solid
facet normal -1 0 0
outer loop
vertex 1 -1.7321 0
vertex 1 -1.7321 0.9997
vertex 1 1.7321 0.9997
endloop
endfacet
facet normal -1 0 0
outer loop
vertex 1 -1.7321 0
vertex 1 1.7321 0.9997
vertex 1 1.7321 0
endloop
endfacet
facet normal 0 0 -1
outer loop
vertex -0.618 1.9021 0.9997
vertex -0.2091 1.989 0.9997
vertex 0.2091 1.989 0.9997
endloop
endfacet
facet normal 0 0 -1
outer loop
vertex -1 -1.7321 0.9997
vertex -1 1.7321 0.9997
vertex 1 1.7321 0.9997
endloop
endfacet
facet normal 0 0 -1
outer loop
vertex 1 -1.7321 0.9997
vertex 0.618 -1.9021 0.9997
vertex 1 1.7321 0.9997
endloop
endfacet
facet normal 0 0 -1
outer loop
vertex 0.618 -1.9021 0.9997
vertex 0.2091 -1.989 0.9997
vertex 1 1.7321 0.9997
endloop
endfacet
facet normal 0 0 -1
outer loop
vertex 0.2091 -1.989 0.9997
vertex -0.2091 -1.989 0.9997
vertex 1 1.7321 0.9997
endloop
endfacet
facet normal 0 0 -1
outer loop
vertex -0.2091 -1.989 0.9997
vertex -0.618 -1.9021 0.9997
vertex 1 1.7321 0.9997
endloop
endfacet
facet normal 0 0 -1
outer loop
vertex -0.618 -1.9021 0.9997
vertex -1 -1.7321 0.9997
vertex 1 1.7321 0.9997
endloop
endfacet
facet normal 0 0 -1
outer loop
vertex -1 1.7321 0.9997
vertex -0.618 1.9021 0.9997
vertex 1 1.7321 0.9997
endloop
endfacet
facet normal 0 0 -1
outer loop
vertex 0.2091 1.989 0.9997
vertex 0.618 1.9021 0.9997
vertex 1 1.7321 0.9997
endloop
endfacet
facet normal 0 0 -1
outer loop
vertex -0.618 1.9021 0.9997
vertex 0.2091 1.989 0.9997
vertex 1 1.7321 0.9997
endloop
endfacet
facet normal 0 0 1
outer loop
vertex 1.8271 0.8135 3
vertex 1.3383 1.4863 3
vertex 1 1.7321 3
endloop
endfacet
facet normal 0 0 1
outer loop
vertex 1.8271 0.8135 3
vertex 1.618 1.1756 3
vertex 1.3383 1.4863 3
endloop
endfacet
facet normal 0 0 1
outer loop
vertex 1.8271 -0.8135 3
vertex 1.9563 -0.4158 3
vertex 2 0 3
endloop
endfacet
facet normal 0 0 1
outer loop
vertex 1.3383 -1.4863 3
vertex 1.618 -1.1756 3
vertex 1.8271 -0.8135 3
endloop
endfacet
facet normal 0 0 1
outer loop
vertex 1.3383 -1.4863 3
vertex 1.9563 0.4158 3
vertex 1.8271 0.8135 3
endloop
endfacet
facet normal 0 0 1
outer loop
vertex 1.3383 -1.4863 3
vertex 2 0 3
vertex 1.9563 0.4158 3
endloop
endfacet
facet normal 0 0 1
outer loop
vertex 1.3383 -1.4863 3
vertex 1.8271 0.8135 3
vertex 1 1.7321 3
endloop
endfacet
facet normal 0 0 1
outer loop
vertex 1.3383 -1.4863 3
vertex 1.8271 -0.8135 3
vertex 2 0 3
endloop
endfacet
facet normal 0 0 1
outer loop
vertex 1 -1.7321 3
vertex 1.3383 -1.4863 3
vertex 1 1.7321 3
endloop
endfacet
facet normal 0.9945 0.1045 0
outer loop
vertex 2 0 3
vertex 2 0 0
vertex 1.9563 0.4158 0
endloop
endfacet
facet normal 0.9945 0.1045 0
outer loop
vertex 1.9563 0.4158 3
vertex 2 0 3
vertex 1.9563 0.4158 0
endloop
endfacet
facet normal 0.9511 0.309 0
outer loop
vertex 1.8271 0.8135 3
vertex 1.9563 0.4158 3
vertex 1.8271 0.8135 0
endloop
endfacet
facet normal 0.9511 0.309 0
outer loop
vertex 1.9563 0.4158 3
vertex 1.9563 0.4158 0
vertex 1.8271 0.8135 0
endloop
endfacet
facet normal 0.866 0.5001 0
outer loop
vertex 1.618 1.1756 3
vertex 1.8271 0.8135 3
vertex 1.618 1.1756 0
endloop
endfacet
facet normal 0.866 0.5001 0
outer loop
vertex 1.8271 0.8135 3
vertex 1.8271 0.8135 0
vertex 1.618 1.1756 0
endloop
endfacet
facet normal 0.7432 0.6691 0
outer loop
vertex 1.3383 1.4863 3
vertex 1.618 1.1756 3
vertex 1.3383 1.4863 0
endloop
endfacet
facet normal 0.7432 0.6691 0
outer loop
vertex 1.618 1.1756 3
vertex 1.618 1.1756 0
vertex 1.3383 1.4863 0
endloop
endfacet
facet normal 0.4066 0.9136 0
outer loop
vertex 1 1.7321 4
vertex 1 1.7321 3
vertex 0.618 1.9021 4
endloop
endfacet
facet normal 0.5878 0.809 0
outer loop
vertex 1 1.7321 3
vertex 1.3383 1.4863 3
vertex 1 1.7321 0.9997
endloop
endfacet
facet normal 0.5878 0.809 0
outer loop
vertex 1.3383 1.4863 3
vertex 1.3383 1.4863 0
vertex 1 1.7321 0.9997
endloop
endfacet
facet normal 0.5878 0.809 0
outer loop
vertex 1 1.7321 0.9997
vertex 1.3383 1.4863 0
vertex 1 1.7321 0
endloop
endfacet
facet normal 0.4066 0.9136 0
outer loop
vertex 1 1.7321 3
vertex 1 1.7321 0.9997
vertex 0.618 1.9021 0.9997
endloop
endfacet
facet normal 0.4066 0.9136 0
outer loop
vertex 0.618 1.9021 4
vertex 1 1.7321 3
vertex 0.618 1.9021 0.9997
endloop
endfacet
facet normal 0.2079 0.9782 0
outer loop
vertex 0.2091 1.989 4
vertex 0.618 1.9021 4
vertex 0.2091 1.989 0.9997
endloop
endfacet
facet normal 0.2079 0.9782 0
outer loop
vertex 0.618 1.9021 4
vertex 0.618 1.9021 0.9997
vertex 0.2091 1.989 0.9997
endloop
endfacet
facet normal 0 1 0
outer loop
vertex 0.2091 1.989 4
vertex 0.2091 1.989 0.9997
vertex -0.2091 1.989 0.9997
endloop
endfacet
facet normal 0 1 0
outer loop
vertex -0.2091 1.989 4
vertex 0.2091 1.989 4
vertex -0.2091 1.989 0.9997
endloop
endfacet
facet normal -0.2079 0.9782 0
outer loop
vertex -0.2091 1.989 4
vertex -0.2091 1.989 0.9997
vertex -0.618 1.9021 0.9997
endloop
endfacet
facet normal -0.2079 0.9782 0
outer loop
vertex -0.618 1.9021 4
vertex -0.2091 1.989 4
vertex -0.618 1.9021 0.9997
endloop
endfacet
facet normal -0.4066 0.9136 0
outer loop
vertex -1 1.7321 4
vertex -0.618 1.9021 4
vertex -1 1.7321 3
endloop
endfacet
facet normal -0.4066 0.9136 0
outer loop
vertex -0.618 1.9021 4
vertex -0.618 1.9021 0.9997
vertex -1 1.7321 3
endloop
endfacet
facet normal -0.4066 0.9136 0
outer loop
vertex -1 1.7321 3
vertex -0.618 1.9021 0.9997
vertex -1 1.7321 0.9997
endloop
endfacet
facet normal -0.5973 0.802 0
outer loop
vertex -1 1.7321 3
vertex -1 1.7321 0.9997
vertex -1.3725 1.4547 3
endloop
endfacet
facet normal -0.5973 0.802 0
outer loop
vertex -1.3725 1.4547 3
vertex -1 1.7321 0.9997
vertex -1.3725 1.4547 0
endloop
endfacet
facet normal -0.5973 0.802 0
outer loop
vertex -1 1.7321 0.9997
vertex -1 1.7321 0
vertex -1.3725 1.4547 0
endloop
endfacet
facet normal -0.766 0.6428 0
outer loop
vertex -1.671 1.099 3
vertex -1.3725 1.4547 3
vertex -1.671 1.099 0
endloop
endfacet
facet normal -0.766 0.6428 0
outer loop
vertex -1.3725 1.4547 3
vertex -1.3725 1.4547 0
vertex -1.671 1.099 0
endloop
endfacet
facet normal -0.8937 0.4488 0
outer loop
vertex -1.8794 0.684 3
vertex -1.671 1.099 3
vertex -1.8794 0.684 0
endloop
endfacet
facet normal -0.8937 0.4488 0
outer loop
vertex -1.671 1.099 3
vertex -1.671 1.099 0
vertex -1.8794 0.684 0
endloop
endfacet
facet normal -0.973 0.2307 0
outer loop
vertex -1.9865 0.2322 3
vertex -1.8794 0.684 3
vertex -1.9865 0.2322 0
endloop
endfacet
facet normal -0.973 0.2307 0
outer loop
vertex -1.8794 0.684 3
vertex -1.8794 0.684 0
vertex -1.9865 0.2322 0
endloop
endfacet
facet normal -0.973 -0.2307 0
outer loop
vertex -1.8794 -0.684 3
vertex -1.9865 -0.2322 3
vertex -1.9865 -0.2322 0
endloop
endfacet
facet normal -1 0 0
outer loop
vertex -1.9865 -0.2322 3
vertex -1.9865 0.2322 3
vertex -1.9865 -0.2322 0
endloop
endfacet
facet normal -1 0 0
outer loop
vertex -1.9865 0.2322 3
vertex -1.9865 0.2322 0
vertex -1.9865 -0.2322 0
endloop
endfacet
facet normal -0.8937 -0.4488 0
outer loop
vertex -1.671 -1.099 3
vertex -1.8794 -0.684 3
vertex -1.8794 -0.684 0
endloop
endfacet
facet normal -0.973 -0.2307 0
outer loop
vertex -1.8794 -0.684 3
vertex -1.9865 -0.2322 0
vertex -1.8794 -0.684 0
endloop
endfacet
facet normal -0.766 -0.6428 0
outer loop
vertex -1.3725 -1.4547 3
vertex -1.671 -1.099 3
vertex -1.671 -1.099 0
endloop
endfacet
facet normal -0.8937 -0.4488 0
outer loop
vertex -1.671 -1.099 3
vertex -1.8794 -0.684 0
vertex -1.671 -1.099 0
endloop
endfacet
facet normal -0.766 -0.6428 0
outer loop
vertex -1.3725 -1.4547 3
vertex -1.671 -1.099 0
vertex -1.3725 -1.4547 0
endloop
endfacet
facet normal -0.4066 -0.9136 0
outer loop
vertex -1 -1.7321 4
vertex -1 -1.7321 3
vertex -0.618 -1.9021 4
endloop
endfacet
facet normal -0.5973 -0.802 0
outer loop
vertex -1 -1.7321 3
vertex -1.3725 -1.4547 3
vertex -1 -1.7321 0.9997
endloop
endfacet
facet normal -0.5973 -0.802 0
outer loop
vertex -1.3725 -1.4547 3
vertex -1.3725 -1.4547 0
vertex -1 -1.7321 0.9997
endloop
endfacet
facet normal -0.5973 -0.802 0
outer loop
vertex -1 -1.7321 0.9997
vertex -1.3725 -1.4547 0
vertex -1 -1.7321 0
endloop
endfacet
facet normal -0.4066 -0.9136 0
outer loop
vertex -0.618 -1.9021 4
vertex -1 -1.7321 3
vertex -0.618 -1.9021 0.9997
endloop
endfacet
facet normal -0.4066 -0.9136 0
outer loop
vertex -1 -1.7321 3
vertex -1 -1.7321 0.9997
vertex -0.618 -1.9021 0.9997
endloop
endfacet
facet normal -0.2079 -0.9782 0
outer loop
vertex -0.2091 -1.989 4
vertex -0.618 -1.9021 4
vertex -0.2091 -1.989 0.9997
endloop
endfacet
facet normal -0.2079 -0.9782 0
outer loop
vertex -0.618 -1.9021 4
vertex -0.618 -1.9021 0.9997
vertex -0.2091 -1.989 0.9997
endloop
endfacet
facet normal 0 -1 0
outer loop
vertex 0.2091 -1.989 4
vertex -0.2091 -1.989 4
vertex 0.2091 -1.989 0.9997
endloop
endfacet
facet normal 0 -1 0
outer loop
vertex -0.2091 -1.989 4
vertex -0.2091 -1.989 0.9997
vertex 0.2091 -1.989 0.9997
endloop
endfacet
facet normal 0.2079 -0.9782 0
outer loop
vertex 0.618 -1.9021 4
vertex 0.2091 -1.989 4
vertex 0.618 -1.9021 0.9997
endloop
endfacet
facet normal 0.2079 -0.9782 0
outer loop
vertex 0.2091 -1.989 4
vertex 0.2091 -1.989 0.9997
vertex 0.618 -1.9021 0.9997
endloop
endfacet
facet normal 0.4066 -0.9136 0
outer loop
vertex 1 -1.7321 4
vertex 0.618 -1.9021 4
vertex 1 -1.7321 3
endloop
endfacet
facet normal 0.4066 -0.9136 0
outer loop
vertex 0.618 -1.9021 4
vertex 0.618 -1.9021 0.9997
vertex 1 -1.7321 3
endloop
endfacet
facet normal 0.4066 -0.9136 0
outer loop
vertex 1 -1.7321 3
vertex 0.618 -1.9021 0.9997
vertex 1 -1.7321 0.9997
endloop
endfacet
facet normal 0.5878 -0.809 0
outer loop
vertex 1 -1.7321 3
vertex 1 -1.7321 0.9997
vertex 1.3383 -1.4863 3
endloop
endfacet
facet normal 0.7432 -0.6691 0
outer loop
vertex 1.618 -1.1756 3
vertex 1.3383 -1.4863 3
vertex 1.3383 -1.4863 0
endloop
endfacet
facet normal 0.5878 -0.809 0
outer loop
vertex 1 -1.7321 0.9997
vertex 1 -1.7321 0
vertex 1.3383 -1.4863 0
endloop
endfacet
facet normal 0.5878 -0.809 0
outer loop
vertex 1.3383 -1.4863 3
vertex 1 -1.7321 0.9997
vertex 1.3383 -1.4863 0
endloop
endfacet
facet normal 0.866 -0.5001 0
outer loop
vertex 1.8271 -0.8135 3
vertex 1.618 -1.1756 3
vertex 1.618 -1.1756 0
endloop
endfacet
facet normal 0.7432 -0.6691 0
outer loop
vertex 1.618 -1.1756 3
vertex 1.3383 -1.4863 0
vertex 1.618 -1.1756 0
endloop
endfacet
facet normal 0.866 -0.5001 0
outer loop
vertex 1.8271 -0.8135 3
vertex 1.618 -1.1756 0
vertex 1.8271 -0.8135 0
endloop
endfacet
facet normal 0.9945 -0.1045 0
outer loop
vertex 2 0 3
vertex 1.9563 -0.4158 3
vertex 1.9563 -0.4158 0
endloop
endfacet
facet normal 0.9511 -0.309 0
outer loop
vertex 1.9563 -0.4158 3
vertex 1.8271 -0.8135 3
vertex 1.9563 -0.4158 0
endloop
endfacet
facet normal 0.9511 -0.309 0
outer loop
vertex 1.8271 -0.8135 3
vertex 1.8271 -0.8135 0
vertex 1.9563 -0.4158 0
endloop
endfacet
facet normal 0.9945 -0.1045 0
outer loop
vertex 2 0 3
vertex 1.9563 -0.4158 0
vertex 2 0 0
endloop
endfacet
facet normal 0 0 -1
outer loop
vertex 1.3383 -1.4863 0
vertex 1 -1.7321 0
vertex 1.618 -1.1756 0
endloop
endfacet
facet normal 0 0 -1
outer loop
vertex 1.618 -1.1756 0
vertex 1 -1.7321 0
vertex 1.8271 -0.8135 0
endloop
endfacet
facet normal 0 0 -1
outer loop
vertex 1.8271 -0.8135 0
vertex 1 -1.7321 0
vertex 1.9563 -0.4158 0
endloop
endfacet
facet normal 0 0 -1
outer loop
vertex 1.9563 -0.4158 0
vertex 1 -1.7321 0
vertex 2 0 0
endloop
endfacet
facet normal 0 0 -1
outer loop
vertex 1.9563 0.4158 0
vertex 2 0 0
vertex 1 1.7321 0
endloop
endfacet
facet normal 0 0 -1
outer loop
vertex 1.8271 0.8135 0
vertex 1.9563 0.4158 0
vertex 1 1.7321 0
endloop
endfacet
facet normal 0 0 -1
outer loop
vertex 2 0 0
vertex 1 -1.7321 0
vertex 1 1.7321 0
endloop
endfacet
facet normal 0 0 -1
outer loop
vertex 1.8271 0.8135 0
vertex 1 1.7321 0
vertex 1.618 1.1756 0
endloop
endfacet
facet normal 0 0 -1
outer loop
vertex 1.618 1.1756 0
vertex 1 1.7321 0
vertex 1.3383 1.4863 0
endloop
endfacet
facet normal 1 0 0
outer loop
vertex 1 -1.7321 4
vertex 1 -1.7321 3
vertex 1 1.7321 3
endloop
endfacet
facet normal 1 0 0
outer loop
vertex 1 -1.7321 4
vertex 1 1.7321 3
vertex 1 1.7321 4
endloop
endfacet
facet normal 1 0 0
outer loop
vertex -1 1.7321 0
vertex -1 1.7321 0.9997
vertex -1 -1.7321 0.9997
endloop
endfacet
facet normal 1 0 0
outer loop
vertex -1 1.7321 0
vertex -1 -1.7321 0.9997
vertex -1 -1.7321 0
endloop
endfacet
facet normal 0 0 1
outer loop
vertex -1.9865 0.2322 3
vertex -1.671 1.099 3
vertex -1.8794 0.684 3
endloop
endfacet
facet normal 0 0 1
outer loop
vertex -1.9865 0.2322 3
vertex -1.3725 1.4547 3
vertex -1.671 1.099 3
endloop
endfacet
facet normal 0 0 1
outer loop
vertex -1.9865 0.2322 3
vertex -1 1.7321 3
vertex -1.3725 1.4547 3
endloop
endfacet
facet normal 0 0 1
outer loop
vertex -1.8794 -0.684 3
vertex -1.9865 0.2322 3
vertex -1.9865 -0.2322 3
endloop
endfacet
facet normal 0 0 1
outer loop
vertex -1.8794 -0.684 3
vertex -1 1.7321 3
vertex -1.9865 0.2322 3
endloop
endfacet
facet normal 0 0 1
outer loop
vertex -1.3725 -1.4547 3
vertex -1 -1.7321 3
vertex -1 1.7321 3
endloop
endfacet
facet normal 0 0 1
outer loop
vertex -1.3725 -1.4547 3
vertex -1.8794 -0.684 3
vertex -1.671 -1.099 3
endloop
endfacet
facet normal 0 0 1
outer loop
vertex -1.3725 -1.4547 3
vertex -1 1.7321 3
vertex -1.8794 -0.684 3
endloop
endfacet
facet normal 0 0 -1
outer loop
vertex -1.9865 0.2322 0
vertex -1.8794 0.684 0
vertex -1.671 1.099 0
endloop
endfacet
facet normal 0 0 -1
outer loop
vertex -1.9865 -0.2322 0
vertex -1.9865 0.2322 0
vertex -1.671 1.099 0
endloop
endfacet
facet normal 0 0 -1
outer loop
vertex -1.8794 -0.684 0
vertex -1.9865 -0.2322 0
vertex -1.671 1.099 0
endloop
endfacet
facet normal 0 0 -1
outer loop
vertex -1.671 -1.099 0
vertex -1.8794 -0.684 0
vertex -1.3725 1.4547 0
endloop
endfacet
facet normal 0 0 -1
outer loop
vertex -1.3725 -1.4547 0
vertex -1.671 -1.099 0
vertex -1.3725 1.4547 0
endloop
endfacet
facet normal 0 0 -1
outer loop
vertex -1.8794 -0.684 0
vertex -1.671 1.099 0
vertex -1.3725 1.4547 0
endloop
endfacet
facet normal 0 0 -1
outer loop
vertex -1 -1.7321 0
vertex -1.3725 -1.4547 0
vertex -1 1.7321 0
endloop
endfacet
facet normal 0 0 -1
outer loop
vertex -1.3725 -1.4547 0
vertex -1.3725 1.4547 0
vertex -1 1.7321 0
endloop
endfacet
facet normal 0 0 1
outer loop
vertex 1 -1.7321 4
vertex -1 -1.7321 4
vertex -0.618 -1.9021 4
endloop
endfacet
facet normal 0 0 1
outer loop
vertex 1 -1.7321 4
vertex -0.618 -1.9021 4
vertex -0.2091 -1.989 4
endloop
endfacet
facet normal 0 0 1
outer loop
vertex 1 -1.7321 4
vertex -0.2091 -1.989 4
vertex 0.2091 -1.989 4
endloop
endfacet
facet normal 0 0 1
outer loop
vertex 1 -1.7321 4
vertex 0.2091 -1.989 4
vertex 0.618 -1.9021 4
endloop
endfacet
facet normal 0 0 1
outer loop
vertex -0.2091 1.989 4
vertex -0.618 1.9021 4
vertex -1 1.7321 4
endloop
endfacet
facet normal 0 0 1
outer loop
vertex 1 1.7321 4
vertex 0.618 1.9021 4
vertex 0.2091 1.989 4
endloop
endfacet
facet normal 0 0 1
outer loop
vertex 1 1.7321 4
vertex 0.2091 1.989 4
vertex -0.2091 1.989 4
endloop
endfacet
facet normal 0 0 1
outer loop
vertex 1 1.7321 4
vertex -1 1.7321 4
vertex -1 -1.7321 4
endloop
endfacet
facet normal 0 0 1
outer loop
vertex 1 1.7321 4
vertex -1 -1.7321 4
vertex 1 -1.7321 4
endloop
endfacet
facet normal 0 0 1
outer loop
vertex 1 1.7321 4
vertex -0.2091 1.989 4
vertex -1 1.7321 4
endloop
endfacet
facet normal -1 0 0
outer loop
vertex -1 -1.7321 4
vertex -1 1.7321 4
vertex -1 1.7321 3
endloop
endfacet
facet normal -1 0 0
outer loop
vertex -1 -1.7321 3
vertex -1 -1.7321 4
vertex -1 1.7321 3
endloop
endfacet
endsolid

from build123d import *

# Parameters (mm, degrees)
SKETCH1_R           = 2
BOSS_EXTRUDE1_DEPTH = 4
SKETCH2_W           = 2
SKETCH2_H           = 0.99968346
CUT_EXTRUDE1_DEPTH  = 5


with BuildPart() as part:
    # Sketch1 → Boss-Extrude1 (new body)
    with BuildSketch(Plane.XY):
        Circle(SKETCH1_R)
    extrude(amount=BOSS_EXTRUDE1_DEPTH)

    # Sketch2 → Cut-Extrude1 (cut, symmetric)
    with BuildSketch(Plane(origin=(0, 0, 0), x_dir=(1, 0, 0), z_dir=(0, 1, 0))):
        Polygon((2, -3), (1, -3), (1, -4.221507546), (-1, -4.26455627), (-1, -3), (-2.31386892, -3), (-2.489753088, -4.306979917), (2, -4.619024092), (2.554571986, -4.221507546), align=None)
        with Locations((0, -0.49984173)):
            Rectangle(SKETCH2_W, SKETCH2_H)
    extrude(amount=CUT_EXTRUDE1_DEPTH, both=True, mode=Mode.SUBTRACT)


solid = part.part
